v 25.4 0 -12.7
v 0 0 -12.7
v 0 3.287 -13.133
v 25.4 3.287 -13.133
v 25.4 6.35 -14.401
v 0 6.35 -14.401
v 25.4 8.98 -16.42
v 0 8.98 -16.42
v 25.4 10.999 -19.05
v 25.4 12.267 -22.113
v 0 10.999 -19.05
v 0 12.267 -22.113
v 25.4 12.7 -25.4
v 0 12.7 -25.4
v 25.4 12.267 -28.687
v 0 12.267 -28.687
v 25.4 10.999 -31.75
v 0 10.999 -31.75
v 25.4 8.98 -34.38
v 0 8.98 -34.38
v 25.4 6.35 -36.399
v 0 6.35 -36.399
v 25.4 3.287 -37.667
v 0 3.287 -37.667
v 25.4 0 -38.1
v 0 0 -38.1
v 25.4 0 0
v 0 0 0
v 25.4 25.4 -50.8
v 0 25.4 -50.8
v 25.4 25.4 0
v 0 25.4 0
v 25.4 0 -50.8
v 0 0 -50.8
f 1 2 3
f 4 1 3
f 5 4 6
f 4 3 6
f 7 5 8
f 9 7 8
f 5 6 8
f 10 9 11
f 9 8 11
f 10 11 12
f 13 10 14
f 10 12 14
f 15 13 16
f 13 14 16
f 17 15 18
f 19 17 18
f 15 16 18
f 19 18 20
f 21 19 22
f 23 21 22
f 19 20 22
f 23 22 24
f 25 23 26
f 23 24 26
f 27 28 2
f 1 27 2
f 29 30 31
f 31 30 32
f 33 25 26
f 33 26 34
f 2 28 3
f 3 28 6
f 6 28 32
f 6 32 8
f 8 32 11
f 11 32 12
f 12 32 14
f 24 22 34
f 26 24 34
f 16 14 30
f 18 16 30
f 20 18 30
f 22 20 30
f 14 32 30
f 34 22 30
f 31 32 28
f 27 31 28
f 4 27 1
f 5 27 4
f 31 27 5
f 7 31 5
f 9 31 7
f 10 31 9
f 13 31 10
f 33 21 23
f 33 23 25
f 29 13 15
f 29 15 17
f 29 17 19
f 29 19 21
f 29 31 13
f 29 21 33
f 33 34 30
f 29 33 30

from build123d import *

# Parameters (mm, degrees)
BOSS_EXTRUDE1_DEPTH = 25.4


with BuildPart() as part:
    # Sketch1 → Boss-Extrude1 (new body)
    with BuildSketch(Plane(origin=(0, 0, 0), x_dir=(0, 0, -1), z_dir=(1, 0, 0))):
        with BuildLine():
            Line((0, 25.4), (0, 0))
            Line((0, 0), (2.459031877, 0))
            Line((2.459031877, 0), (12.7, 0))
            ThreePointArc((12.7, 0), (25.4, 12.7), (38.1, 0))
            Line((38.1, 0), (50.8, 0))
            Line((50.8, 0), (50.8, 25.4))
            Line((50.8, 25.4), (0, 25.4))
        make_face()
    extrude(amount=BOSS_EXTRUDE1_DEPTH)


solid = part.part
